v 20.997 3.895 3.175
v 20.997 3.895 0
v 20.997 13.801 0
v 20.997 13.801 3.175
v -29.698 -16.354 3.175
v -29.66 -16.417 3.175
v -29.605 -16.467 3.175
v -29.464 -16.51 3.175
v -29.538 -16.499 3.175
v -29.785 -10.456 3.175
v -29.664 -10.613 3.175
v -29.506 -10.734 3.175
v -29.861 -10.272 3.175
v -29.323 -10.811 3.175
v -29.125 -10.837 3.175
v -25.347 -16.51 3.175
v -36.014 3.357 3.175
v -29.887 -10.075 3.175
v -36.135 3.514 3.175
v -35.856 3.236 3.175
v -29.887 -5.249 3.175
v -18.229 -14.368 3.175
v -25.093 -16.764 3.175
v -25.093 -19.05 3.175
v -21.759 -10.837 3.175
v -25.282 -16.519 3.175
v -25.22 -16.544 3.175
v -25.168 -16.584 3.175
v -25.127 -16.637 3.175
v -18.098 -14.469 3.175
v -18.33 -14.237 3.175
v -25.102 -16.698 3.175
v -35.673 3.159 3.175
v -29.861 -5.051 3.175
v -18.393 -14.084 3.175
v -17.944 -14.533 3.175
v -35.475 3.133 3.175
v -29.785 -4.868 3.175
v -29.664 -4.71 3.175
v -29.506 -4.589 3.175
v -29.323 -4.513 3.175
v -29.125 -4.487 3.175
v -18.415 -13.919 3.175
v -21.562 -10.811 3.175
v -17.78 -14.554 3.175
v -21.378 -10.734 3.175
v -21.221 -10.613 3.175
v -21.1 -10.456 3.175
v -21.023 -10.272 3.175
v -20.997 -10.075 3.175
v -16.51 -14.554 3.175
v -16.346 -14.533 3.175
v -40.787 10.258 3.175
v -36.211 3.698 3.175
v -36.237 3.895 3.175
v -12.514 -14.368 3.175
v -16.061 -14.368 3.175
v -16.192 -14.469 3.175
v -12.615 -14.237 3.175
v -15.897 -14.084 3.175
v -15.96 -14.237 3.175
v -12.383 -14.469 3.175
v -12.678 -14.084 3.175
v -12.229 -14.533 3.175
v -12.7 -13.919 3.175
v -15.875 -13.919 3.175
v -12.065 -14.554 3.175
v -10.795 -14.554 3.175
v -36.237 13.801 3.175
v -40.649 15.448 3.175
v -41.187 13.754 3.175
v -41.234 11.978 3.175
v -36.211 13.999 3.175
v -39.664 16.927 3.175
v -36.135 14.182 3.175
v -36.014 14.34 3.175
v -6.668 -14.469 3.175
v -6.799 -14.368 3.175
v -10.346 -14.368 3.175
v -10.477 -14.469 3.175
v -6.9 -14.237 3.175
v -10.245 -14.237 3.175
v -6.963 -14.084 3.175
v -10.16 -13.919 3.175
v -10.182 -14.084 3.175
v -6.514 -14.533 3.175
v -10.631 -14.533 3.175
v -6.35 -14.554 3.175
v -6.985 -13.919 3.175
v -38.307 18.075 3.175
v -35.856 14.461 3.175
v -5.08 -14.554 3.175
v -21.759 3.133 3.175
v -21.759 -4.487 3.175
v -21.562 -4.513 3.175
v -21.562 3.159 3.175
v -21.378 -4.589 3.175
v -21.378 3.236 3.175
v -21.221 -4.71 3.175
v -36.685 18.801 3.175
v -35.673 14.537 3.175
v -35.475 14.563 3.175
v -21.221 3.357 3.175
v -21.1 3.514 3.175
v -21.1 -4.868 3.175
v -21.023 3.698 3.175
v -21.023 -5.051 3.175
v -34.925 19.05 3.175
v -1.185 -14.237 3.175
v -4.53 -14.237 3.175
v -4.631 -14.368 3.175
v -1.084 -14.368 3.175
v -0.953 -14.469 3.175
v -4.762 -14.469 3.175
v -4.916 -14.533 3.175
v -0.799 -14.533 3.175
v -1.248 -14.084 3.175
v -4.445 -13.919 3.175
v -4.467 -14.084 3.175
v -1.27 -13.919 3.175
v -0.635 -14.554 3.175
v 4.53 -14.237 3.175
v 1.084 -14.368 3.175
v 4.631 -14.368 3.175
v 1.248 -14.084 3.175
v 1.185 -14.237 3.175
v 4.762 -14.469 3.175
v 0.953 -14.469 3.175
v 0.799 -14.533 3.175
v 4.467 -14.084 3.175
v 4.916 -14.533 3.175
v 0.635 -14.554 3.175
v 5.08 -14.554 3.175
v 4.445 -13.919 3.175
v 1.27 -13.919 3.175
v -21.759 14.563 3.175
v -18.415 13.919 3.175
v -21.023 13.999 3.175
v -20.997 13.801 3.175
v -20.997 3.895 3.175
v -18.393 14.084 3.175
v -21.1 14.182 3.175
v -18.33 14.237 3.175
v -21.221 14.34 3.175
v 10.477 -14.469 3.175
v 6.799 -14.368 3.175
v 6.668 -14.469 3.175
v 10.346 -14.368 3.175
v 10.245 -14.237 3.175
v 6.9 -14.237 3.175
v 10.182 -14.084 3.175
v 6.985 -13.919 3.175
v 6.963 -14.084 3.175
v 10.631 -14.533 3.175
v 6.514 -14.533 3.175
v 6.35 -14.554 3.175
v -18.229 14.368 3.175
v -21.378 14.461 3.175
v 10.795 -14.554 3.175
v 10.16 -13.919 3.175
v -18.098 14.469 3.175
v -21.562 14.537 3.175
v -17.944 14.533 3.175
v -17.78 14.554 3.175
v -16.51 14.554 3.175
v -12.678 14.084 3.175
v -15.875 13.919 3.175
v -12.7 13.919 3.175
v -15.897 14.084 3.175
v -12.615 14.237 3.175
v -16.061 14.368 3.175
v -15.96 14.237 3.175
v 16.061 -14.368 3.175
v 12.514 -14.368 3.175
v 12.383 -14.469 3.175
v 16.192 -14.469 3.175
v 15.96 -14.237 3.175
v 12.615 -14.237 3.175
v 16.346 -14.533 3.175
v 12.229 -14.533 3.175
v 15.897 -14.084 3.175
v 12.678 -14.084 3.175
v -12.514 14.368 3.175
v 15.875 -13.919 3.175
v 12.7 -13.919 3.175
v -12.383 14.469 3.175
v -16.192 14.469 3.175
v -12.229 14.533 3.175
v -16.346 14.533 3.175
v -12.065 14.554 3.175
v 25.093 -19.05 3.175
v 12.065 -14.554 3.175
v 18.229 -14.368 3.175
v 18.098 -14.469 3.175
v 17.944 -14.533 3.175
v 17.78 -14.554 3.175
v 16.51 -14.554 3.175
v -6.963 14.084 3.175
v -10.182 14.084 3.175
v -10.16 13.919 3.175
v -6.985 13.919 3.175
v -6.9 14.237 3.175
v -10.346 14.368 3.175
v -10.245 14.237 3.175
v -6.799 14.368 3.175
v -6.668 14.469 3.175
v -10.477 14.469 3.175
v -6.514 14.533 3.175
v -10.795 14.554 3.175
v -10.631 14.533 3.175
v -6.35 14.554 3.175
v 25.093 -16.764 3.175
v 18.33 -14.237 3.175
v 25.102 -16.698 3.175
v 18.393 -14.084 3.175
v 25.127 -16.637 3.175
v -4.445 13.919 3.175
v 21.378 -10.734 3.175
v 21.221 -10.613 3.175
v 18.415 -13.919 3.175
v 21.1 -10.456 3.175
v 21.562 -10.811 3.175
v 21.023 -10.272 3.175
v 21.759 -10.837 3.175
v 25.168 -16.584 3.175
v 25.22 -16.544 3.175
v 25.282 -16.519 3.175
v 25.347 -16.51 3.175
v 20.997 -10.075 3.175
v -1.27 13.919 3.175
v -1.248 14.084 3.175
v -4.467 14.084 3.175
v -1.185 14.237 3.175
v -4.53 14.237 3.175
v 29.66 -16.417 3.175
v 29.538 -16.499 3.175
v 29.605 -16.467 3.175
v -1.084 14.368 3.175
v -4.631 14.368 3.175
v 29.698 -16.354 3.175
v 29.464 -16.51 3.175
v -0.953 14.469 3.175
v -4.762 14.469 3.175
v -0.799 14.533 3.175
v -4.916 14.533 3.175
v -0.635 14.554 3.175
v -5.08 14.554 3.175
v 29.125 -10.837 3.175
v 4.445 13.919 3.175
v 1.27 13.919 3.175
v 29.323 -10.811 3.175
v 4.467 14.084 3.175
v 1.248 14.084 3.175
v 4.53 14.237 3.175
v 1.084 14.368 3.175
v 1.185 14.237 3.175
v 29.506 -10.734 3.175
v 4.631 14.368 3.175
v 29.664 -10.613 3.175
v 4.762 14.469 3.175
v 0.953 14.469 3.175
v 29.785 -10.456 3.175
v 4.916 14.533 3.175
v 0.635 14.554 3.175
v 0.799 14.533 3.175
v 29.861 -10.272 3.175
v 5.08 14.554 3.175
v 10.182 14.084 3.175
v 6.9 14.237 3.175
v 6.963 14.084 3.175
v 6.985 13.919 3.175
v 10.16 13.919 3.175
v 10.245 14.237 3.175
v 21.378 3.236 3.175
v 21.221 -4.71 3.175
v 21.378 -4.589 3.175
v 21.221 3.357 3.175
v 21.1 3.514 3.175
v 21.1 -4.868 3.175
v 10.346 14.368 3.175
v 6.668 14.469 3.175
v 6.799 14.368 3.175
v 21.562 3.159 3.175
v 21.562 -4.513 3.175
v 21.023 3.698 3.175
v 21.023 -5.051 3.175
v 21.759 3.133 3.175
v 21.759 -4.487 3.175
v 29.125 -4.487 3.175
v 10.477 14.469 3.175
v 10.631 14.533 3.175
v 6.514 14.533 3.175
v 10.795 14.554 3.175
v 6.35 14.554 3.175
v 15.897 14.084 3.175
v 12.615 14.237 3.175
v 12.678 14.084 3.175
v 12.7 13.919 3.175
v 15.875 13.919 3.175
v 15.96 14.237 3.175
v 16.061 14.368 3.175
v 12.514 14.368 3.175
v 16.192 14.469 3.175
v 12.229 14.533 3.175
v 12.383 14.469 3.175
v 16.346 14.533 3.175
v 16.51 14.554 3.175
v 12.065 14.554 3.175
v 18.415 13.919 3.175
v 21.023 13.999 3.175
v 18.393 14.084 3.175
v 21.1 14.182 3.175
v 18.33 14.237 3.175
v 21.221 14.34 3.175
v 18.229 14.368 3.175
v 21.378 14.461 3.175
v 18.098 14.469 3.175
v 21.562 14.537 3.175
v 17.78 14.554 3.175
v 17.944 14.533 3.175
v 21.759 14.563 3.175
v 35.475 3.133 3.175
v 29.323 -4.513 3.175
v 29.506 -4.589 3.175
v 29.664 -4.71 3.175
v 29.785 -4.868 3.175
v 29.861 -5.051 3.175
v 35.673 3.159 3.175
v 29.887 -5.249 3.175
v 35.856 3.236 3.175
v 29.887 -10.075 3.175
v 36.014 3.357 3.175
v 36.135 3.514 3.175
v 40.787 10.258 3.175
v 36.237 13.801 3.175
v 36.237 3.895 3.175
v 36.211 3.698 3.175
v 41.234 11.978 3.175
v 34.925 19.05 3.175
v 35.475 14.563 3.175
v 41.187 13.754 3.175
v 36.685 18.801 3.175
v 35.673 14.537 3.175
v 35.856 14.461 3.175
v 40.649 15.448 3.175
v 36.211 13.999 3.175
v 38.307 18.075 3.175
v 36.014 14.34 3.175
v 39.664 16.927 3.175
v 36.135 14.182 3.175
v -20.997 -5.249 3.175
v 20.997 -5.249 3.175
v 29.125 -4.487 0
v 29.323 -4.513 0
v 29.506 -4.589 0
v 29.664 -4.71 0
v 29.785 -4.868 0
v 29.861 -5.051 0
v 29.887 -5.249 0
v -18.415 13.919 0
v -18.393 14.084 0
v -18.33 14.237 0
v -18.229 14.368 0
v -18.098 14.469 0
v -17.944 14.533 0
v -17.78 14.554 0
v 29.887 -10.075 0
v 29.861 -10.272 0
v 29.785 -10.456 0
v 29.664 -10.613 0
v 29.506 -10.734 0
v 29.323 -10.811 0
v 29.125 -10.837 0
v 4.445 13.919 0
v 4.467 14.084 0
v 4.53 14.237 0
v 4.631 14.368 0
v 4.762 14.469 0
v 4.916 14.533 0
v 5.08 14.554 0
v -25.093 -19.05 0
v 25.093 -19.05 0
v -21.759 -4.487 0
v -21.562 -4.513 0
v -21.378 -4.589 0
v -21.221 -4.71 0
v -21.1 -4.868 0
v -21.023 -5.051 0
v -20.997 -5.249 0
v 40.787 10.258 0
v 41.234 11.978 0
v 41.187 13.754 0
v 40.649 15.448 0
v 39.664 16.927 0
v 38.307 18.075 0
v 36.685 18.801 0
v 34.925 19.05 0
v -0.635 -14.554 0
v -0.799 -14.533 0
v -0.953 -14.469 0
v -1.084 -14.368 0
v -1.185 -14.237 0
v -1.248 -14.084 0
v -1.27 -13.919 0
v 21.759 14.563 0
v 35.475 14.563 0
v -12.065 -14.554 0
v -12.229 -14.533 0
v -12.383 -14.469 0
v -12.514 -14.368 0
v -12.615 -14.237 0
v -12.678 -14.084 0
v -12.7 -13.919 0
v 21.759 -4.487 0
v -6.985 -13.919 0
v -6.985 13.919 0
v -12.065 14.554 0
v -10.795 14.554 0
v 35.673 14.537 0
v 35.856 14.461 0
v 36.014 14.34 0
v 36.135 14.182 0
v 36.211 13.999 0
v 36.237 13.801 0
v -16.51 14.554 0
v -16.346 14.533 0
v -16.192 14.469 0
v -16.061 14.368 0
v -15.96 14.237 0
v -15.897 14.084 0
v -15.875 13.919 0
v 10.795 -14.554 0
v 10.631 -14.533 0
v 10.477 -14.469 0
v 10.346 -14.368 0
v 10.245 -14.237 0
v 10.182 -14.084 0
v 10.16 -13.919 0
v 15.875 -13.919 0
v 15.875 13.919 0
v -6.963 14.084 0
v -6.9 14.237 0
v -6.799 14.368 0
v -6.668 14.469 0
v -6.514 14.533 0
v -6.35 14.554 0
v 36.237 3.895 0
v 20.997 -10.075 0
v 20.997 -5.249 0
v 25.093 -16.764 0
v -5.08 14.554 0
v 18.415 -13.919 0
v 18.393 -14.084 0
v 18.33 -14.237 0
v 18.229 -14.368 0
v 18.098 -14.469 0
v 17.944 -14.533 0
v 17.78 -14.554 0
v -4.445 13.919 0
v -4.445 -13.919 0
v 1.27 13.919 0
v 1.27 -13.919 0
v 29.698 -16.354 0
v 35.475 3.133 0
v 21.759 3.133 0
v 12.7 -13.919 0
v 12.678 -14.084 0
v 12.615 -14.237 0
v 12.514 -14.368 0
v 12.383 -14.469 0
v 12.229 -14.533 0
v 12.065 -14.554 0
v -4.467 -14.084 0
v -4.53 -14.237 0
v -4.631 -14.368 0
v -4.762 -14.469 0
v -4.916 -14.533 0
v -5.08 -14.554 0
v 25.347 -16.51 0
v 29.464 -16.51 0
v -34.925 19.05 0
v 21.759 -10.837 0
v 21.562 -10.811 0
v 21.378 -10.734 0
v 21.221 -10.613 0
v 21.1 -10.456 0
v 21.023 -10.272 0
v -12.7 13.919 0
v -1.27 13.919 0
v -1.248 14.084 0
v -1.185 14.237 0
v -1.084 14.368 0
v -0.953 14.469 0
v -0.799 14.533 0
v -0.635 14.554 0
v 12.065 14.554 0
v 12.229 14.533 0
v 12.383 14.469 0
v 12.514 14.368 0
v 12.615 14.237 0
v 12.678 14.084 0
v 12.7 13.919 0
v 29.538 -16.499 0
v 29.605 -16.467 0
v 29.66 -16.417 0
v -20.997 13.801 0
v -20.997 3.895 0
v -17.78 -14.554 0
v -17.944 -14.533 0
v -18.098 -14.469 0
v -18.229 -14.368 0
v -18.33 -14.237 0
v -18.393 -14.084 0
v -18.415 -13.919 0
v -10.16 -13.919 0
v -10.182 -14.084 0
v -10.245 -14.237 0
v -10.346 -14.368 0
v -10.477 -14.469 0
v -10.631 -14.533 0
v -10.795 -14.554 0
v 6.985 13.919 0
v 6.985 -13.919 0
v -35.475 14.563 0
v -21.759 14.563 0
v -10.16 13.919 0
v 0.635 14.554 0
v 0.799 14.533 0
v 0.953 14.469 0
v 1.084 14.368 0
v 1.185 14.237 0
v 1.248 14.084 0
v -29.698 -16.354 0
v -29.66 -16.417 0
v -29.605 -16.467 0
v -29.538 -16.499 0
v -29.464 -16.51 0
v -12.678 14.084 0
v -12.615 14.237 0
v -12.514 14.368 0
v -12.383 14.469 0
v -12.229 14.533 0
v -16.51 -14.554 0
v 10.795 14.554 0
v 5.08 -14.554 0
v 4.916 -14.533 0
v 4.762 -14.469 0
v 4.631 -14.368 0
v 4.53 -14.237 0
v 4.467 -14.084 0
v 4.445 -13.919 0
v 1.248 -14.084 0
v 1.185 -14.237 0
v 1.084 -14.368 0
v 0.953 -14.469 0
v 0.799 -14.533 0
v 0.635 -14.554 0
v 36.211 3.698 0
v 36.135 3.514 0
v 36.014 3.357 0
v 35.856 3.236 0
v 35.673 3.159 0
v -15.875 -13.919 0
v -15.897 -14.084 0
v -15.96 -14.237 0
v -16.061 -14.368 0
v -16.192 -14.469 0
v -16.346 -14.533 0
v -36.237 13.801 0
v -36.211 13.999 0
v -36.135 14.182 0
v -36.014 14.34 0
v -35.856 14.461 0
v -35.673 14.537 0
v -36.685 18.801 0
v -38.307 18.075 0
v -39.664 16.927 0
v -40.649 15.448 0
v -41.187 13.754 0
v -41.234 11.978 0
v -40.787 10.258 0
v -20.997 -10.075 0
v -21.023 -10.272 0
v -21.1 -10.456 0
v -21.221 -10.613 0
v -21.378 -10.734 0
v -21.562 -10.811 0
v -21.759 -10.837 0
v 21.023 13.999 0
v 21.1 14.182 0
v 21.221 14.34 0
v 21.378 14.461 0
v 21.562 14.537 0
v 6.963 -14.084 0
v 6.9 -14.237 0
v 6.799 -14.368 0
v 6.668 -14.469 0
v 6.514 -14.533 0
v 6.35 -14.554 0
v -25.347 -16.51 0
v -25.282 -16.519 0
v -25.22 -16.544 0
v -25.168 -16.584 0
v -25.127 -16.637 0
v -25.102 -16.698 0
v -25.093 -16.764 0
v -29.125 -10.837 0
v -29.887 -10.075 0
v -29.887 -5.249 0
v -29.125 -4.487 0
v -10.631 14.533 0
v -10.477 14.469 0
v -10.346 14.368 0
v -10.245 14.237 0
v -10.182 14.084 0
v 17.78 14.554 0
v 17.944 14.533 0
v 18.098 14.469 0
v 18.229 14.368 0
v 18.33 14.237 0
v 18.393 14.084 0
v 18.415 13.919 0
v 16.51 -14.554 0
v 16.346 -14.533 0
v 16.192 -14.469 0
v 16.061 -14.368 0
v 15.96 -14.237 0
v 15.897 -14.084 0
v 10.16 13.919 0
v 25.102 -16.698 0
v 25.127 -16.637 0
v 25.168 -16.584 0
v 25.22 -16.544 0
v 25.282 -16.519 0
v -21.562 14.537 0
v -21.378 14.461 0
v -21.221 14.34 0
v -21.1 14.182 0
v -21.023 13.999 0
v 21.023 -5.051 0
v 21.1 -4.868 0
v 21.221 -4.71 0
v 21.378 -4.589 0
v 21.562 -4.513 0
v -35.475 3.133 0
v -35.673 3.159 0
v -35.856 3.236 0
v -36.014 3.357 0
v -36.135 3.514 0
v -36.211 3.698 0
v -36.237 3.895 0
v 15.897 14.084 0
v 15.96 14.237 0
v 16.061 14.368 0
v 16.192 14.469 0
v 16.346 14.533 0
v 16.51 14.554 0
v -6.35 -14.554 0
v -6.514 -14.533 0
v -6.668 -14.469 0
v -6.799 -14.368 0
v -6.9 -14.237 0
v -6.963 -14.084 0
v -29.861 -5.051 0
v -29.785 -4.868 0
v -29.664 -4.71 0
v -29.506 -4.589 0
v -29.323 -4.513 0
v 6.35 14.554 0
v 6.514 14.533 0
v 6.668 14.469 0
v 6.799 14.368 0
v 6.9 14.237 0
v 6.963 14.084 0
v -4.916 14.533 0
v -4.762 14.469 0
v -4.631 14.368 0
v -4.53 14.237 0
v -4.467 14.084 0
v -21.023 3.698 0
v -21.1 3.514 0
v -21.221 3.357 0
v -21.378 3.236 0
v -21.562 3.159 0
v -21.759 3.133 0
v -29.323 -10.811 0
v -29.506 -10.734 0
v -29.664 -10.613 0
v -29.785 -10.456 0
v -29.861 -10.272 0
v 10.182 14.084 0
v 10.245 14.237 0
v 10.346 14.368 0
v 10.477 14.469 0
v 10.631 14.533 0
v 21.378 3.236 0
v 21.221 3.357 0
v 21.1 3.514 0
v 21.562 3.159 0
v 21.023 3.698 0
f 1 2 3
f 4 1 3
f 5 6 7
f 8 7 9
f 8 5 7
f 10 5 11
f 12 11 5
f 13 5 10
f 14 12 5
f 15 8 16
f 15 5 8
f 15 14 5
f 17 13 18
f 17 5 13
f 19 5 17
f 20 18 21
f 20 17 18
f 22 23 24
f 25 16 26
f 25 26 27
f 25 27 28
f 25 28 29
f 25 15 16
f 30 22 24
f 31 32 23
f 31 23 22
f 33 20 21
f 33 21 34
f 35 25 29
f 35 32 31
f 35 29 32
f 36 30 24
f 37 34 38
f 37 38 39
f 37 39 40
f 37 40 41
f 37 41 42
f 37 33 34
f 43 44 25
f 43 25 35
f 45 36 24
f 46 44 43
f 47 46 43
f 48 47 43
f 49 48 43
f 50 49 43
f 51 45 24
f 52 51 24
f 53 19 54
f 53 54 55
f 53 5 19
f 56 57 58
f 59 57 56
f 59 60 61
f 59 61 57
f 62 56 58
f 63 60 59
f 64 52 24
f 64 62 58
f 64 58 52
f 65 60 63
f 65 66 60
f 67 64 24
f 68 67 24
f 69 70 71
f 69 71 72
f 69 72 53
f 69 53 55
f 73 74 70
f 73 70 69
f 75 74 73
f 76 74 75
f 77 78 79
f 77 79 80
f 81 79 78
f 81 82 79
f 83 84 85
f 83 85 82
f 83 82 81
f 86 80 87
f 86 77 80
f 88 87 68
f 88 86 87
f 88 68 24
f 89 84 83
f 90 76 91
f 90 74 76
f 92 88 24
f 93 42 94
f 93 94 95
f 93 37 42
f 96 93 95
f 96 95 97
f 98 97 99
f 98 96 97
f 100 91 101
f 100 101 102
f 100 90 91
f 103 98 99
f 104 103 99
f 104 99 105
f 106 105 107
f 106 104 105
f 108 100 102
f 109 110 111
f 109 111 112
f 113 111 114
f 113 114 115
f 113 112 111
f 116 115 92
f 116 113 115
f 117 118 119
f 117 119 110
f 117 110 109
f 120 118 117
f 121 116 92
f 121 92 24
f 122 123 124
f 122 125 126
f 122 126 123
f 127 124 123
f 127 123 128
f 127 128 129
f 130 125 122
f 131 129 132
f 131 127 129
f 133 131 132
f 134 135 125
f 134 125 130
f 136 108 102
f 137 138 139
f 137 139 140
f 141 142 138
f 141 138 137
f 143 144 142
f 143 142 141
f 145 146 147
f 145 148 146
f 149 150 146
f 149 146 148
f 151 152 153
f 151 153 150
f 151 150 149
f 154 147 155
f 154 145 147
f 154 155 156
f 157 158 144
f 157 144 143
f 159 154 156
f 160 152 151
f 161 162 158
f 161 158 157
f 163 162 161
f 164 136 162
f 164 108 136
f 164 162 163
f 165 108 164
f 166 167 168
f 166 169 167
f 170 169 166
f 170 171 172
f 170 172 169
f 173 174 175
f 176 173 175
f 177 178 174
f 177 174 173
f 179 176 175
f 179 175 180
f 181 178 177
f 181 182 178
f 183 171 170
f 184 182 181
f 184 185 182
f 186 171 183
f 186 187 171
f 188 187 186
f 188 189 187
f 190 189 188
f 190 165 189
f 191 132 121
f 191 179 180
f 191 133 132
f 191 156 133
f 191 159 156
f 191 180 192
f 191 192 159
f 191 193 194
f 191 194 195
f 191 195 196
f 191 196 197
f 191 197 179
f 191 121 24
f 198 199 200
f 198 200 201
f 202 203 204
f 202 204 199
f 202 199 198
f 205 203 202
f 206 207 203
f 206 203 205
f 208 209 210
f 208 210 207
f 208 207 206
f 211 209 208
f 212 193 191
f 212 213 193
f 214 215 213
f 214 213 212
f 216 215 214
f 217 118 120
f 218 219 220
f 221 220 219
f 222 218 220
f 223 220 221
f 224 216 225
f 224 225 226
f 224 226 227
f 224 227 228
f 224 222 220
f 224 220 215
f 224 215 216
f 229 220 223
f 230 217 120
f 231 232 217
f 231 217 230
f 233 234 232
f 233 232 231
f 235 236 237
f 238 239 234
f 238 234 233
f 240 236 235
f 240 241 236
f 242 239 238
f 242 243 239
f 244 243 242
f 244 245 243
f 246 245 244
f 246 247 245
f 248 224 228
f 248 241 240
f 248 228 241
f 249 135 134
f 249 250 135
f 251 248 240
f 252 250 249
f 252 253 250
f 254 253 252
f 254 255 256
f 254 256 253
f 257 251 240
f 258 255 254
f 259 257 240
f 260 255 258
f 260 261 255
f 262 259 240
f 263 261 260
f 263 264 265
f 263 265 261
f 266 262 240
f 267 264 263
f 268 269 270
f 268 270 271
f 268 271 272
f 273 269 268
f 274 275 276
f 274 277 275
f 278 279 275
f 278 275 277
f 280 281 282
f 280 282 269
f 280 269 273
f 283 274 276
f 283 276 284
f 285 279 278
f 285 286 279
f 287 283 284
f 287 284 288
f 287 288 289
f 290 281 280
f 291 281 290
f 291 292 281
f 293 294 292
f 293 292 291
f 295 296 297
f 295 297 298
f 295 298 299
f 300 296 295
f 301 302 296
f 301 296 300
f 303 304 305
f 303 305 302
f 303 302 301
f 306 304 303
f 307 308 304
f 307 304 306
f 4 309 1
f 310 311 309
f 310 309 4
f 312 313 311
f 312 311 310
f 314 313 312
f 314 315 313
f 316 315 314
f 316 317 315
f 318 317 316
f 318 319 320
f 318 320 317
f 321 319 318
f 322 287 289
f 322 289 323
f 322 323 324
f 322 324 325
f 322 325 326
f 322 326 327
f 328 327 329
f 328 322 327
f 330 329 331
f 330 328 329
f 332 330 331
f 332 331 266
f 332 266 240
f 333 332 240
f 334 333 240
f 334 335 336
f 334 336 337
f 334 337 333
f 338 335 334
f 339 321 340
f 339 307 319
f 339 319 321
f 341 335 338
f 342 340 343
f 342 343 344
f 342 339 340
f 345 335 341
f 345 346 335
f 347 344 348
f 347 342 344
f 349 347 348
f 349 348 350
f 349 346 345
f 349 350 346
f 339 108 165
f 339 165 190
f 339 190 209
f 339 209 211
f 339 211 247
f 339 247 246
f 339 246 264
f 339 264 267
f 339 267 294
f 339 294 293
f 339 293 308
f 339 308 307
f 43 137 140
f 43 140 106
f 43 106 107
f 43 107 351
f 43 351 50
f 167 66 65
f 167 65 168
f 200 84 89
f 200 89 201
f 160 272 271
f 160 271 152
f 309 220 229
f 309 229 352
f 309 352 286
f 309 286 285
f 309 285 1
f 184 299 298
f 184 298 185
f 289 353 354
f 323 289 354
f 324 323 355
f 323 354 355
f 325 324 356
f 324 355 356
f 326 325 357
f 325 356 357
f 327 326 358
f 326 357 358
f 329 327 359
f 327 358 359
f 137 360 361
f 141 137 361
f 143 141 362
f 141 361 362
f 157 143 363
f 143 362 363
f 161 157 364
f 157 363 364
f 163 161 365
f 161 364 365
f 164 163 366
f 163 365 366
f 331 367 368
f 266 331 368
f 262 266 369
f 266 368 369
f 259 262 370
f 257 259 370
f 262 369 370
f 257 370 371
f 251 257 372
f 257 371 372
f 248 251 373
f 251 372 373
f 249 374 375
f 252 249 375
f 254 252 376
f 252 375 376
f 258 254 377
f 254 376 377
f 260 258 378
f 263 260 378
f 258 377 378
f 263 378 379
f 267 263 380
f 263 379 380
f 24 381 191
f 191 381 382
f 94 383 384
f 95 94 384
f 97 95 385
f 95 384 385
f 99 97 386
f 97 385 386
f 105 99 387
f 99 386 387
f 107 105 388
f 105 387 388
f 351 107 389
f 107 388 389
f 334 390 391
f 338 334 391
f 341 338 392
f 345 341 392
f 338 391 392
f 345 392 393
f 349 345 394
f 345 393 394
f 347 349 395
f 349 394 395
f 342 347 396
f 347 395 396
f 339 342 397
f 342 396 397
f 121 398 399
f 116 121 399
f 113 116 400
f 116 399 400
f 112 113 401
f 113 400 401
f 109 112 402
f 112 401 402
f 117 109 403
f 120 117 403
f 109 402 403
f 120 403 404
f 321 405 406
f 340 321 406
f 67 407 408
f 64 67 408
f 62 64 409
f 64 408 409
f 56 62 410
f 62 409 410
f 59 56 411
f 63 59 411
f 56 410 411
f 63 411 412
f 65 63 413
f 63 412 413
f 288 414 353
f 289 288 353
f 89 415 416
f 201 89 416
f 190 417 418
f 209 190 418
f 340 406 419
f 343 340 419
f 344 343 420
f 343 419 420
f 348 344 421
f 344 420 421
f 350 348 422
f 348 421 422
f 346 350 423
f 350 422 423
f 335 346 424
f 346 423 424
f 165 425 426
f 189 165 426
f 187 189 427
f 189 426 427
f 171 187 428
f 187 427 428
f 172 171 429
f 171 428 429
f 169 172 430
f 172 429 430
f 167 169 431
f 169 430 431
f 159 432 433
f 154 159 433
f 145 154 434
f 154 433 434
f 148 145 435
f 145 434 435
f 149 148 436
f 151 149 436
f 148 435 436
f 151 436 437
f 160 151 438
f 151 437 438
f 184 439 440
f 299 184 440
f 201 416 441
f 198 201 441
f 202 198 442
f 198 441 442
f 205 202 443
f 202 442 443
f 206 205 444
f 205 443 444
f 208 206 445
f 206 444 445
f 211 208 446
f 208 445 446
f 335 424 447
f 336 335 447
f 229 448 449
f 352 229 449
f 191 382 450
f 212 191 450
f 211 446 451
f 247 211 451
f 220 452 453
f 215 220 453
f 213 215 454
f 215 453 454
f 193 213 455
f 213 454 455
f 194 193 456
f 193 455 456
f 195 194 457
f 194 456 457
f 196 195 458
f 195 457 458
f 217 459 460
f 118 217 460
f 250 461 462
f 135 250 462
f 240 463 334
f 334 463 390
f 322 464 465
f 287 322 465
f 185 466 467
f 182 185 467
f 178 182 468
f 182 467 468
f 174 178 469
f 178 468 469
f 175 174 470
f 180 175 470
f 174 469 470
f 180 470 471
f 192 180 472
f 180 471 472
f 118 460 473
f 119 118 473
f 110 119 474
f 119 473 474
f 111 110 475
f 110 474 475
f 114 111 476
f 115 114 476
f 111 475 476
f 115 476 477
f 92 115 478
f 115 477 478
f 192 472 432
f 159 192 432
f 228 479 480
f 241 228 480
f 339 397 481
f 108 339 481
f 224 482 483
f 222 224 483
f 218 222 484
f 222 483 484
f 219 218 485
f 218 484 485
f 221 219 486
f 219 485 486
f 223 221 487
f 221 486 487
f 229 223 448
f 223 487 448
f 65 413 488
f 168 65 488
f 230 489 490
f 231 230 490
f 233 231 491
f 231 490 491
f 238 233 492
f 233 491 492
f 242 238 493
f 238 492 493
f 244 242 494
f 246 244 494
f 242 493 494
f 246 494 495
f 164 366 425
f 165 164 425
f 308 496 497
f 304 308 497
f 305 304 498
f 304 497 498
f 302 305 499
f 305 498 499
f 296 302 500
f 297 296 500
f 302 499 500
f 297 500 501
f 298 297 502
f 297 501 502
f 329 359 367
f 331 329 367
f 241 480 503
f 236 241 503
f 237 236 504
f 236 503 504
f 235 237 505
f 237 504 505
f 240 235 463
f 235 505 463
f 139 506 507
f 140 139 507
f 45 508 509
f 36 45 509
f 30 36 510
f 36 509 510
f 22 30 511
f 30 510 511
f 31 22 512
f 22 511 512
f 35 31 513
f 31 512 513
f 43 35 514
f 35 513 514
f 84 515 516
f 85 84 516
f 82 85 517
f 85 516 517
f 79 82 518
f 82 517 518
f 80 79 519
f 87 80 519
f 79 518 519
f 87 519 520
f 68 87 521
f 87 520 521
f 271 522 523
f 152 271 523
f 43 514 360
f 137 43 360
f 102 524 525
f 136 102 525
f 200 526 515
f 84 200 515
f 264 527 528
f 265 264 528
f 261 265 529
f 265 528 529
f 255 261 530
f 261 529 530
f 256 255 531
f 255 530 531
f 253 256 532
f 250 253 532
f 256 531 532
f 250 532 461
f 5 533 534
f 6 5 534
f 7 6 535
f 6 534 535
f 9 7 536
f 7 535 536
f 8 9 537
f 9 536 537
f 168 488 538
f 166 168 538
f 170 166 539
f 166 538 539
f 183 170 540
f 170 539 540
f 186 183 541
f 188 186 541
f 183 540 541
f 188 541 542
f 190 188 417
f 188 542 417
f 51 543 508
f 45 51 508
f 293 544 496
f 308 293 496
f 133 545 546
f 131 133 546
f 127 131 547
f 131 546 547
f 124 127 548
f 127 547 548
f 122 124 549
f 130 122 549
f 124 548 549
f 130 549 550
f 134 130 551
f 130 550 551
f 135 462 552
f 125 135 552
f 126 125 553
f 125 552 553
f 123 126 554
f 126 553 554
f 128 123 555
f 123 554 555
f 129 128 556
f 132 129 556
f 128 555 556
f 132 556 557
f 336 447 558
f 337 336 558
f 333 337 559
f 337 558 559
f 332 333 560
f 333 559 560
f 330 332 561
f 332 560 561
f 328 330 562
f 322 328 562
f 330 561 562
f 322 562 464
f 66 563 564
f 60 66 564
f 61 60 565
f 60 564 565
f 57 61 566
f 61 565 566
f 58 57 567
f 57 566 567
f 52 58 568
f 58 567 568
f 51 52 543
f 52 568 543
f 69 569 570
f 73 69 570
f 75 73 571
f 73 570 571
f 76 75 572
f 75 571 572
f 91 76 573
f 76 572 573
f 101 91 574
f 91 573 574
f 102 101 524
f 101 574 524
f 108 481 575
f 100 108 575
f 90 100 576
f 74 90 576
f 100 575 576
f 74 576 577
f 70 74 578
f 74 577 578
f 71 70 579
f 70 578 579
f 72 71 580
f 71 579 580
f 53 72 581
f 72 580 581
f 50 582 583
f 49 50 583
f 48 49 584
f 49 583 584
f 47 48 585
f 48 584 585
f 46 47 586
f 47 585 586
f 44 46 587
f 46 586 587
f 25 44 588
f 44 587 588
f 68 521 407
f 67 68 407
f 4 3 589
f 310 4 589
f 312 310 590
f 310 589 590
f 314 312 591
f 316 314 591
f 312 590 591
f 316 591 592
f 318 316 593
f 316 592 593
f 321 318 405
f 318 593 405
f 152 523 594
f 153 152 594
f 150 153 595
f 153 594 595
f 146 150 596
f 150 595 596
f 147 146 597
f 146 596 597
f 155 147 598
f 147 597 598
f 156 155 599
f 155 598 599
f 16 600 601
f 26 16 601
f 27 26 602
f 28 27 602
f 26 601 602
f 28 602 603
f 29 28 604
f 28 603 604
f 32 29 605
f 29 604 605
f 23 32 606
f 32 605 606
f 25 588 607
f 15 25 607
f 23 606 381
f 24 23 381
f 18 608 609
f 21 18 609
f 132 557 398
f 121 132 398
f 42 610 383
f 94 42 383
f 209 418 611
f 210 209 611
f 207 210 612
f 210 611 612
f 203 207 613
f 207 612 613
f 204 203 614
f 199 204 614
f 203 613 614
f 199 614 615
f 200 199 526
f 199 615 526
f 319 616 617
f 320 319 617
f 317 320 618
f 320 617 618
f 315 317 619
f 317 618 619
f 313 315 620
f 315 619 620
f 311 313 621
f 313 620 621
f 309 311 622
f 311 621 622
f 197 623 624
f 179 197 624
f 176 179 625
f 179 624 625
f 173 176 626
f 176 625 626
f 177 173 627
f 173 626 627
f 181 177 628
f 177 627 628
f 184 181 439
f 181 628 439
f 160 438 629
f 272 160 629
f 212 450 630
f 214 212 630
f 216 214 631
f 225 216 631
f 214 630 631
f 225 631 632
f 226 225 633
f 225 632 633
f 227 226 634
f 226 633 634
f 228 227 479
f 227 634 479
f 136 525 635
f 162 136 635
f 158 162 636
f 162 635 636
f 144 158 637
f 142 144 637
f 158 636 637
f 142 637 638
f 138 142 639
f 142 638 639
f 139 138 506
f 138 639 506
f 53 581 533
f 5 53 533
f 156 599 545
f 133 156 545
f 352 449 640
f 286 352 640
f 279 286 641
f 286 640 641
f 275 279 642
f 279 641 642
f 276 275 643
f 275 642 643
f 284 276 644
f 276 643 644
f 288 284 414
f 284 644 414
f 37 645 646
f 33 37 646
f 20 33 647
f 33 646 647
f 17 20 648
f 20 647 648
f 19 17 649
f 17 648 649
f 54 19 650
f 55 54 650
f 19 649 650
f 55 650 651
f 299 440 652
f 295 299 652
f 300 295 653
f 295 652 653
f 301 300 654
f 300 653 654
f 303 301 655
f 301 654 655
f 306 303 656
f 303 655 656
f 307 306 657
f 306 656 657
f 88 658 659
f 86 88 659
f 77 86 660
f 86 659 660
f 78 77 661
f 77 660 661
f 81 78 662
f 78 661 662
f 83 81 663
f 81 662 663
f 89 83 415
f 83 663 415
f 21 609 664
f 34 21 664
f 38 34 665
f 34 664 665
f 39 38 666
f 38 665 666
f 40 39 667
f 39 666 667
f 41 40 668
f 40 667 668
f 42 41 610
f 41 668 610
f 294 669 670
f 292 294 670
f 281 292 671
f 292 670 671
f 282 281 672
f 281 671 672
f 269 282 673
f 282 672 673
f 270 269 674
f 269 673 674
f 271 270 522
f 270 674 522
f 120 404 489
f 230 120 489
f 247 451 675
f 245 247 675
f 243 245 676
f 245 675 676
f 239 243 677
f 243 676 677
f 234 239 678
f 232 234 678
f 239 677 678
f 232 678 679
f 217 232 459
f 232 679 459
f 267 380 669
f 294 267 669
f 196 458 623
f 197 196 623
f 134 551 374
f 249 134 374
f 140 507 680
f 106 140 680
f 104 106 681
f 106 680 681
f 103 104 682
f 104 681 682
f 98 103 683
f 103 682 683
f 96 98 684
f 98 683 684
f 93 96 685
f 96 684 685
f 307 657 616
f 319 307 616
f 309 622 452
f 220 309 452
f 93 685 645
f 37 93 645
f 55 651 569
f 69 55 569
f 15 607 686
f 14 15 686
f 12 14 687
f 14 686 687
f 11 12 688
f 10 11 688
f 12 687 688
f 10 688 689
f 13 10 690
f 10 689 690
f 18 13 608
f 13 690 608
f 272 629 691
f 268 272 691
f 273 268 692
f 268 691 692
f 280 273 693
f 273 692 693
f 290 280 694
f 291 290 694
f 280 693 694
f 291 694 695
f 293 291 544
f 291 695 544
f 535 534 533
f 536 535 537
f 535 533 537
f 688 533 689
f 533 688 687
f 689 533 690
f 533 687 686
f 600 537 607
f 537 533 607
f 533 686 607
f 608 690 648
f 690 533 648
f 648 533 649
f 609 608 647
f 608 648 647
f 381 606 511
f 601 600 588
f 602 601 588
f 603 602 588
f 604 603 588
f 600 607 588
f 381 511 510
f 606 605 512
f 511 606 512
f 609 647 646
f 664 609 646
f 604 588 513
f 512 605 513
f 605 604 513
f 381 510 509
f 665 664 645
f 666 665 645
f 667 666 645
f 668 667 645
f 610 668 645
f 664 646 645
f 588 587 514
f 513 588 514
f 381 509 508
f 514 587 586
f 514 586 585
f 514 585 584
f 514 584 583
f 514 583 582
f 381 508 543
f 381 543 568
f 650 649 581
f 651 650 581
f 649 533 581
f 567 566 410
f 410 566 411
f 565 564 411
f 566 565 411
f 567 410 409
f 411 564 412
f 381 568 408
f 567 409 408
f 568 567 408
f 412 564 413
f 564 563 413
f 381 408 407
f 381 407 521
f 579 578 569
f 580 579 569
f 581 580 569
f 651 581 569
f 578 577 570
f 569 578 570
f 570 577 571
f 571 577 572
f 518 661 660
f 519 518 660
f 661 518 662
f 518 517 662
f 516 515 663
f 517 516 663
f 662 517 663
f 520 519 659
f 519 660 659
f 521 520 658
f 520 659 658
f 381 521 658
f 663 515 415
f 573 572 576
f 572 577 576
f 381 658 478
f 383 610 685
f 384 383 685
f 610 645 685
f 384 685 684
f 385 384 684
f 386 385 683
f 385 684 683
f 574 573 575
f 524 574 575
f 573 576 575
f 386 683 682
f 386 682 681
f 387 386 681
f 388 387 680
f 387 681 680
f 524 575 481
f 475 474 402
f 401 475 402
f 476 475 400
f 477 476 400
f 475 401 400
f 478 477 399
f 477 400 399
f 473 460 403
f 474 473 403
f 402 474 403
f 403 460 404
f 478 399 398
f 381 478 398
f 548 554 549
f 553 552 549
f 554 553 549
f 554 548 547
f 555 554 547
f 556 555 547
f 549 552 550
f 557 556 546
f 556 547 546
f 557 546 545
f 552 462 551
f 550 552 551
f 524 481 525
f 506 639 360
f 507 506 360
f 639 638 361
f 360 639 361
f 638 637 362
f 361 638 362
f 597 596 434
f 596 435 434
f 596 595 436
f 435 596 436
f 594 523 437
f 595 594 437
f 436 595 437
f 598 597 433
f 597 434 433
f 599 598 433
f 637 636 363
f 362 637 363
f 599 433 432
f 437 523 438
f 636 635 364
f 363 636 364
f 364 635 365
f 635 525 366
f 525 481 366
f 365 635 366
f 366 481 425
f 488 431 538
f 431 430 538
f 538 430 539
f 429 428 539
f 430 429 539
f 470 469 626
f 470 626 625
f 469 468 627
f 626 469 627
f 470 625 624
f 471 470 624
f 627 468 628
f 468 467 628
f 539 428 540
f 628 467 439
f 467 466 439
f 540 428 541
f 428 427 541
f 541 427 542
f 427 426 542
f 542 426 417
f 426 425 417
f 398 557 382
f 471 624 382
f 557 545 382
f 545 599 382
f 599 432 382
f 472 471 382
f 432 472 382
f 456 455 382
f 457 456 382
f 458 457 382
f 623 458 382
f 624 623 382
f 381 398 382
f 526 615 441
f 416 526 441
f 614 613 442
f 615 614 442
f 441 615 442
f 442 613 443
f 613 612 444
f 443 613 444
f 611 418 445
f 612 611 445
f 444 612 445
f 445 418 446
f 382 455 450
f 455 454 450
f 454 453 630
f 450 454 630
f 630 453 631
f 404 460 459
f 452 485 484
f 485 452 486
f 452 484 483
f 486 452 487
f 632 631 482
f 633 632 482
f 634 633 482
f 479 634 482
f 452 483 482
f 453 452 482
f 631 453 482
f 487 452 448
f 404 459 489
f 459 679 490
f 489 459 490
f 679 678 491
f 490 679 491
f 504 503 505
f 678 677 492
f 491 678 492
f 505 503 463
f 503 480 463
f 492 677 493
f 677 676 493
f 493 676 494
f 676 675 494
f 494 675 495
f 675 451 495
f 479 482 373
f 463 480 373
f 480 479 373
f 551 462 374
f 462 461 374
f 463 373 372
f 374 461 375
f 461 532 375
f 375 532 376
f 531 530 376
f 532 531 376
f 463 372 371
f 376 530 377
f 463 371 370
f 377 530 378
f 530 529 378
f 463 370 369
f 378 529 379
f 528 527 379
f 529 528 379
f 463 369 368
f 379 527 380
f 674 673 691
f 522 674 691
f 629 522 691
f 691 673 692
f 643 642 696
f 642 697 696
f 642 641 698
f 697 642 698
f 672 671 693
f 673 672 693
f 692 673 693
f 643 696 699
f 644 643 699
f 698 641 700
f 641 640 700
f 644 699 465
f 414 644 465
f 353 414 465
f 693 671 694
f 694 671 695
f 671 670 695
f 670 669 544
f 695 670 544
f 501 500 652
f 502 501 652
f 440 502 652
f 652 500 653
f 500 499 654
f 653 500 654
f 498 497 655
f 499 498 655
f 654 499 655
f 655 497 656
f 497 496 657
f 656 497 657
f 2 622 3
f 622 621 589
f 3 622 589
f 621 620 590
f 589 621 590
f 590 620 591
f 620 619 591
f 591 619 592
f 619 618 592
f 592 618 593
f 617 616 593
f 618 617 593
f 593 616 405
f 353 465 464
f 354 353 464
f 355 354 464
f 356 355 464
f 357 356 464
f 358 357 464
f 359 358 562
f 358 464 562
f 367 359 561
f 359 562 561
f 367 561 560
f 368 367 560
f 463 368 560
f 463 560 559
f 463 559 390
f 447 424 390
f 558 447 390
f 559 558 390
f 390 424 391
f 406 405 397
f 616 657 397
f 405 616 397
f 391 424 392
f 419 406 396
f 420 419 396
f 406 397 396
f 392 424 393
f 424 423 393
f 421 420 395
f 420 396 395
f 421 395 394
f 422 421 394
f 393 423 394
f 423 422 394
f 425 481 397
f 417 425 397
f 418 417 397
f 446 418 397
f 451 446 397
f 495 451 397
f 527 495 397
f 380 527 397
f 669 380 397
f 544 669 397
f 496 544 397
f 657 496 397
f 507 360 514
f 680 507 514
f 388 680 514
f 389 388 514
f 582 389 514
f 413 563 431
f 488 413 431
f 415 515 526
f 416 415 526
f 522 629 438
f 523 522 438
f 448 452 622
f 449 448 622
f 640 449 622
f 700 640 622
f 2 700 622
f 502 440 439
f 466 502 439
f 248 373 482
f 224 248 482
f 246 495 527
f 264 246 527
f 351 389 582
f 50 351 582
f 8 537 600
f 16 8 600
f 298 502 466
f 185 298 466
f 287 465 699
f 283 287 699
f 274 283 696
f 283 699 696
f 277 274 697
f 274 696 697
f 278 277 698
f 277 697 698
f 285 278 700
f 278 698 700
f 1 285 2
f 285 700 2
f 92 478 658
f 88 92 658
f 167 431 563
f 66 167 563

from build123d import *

# Parameters (mm, degrees)
F1_DEPTH = 3.175


with BuildPart() as f1:
    # F0 (on Top) → F1 (new body)
    with BuildSketch(Plane.XY):
        with BuildLine():
            ThreePointArc((40.786538, 10.257692), (40.208519, 16.222346), (34.925, 19.05))
            Line((34.925, 19.05), (0.141111, 19.05))
            Line((0.141111, 19.05), (-0.141111, 19.05))
            Line((-0.141111, 19.05), (-34.925, 19.05))
            ThreePointArc((-34.925, 19.05), (-40.208519, 16.222346), (-40.786538, 10.257692))
            Line((-40.786538, 10.257692), (-29.698462, -16.353692))
            ThreePointArc((-29.698462, -16.353692), (-29.604894, -16.467341), (-29.464, -16.51))
            Line((-29.464, -16.51), (-25.347444, -16.51))
            ThreePointArc((-25.347444, -16.51), (-25.167839, -16.584395), (-25.093444, -16.764))
            Line((-25.093444, -16.764), (-25.093444, -19.05))
            Line((-25.093444, -19.05), (-0.141111, -19.05))
            Line((-0.141111, -19.05), (0.141111, -19.05))
            Line((0.141111, -19.05), (25.093444, -19.05))
            Line((25.093444, -19.05), (25.093444, -16.764))
            ThreePointArc((25.093444, -16.764), (25.167839, -16.584395), (25.347444, -16.51))
            Line((25.347444, -16.51), (29.464, -16.51))
            ThreePointArc((29.464, -16.51), (29.604894, -16.467341), (29.698462, -16.353692))
            Line((29.698462, -16.353692), (40.786538, 10.257692))
        make_face()
        with BuildLine():
            Line((-21.759422, -10.836581), (-29.125422, -10.836581))
            ThreePointArc((-29.125422, -10.836581), (-29.664238, -10.613396), (-29.887422, -10.074581))
            Line((-29.887422, -10.074581), (-29.887422, -5.248581))
            ThreePointArc((-29.887422, -5.248581), (-29.664238, -4.709765), (-29.125422, -4.486581))
            Line((-29.125422, -4.486581), (-21.759422, -4.486581))
            ThreePointArc((-21.759422, -4.486581), (-21.220607, -4.709765), (-20.997422, -5.248581))
            Line((-20.997422, -5.248581), (-20.997422, -10.074581))
            ThreePointArc((-20.997422, -10.074581), (-21.220607, -10.613396), (-21.759422, -10.836581))
        make_face(mode=Mode.SUBTRACT)
        with BuildLine():
            Line((21.759422, -4.486581), (29.125422, -4.486581))
            ThreePointArc((29.125422, -4.486581), (29.664238, -4.709765), (29.887422, -5.248581))
            Line((29.887422, -5.248581), (29.887422, -10.074581))
            ThreePointArc((29.887422, -10.074581), (29.664238, -10.613396), (29.125422, -10.836581))
            Line((29.125422, -10.836581), (21.759422, -10.836581))
            ThreePointArc((21.759422, -10.836581), (21.220607, -10.613396), (20.997422, -10.074581))
            Line((20.997422, -10.074581), (20.997422, -5.248581))
            ThreePointArc((20.997422, -5.248581), (21.220607, -4.709765), (21.759422, -4.486581))
        make_face(mode=Mode.SUBTRACT)
        with BuildLine():
            Line((-21.759422, 3.133419), (-35.475422, 3.133419))
            ThreePointArc((-35.475422, 3.133419), (-36.014238, 3.356604), (-36.237422, 3.895419))
            Line((-36.237422, 3.895419), (-36.237422, 13.801419))
            ThreePointArc((-36.237422, 13.801419), (-36.014238, 14.340235), (-35.475422, 14.563419))
            Line((-35.475422, 14.563419), (-21.759422, 14.563419))
            ThreePointArc((-21.759422, 14.563419), (-21.220607, 14.340235), (-20.997422, 13.801419))
            Line((-20.997422, 13.801419), (-20.997422, 3.895419))
            ThreePointArc((-20.997422, 3.895419), (-21.220607, 3.356604), (-21.759422, 3.133419))
        make_face(mode=Mode.SUBTRACT)
        with BuildLine():
            Line((-18.415, -13.9192), (-18.415, 13.9192))
            ThreePointArc((-18.415, 13.9192), (-18.229013, 14.368213), (-17.78, 14.5542))
            Line((-17.78, 14.5542), (-16.51, 14.5542))
            ThreePointArc((-16.51, 14.5542), (-16.060987, 14.368213), (-15.875, 13.9192))
            Line((-15.875, 13.9192), (-15.875, -13.9192))
            ThreePointArc((-15.875, -13.9192), (-16.060987, -14.368213), (-16.51, -14.5542))
            Line((-16.51, -14.5542), (-17.78, -14.5542))
            ThreePointArc((-17.78, -14.5542), (-18.229013, -14.368213), (-18.415, -13.9192))
        make_face(mode=Mode.SUBTRACT)
        with BuildLine():
            Line((-12.7, -13.9192), (-12.7, 13.9192))
            ThreePointArc((-12.7, 13.9192), (-12.514013, 14.368213), (-12.065, 14.5542))
            Line((-12.065, 14.5542), (-10.795, 14.5542))
            ThreePointArc((-10.795, 14.5542), (-10.345987, 14.368213), (-10.16, 13.9192))
            Line((-10.16, 13.9192), (-10.16, -13.9192))
            ThreePointArc((-10.16, -13.9192), (-10.345987, -14.368213), (-10.795, -14.5542))
            Line((-10.795, -14.5542), (-12.065, -14.5542))
            ThreePointArc((-12.065, -14.5542), (-12.514013, -14.368213), (-12.7, -13.9192))
        make_face(mode=Mode.SUBTRACT)
        with BuildLine():
            Line((-6.985, -13.9192), (-6.985, 13.9192))
            ThreePointArc((-6.985, 13.9192), (-6.799013, 14.368213), (-6.35, 14.5542))
            Line((-6.35, 14.5542), (-5.08, 14.5542))
            ThreePointArc((-5.08, 14.5542), (-4.630987, 14.368213), (-4.445, 13.9192))
            Line((-4.445, 13.9192), (-4.445, -13.9192))
            ThreePointArc((-4.445, -13.9192), (-4.630987, -14.368213), (-5.08, -14.5542))
            Line((-5.08, -14.5542), (-6.35, -14.5542))
            ThreePointArc((-6.35, -14.5542), (-6.799013, -14.368213), (-6.985, -13.9192))
        make_face(mode=Mode.SUBTRACT)
        with BuildLine():
            Line((-0.635, 14.5542), (0.635, 14.5542))
            ThreePointArc((0.635, 14.5542), (1.084013, 14.368213), (1.27, 13.9192))
            Line((1.27, 13.9192), (1.27, -13.9192))
            ThreePointArc((1.27, -13.9192), (1.084013, -14.368213), (0.635, -14.5542))
            Line((0.635, -14.5542), (-0.635, -14.5542))
            ThreePointArc((-0.635, -14.5542), (-1.084013, -14.368213), (-1.27, -13.9192))
            Line((-1.27, -13.9192), (-1.27, 13.9192))
            ThreePointArc((-1.27, 13.9192), (-1.084013, 14.368213), (-0.635, 14.5542))
        make_face(mode=Mode.SUBTRACT)
        with BuildLine():
            ThreePointArc((6.35, 14.5542), (6.799013, 14.368213), (6.985, 13.9192))
            Line((6.985, 13.9192), (6.985, -13.9192))
            ThreePointArc((6.985, -13.9192), (6.799013, -14.368213), (6.35, -14.5542))
            Line((6.35, -14.5542), (5.08, -14.5542))
            ThreePointArc((5.08, -14.5542), (4.630987, -14.368213), (4.445, -13.9192))
            Line((4.445, -13.9192), (4.445, 13.9192))
            ThreePointArc((4.445, 13.9192), (4.630987, 14.368213), (5.08, 14.5542))
            Line((5.08, 14.5542), (6.35, 14.5542))
        make_face(mode=Mode.SUBTRACT)
        with BuildLine():
            ThreePointArc((12.065, 14.5542), (12.514013, 14.368213), (12.7, 13.9192))
            Line((12.7, 13.9192), (12.7, -13.9192))
            ThreePointArc((12.7, -13.9192), (12.514013, -14.368213), (12.065, -14.5542))
            Line((12.065, -14.5542), (10.795, -14.5542))
            ThreePointArc((10.795, -14.5542), (10.345987, -14.368213), (10.16, -13.9192))
            Line((10.16, -13.9192), (10.16, 13.9192))
            ThreePointArc((10.16, 13.9192), (10.345987, 14.368213), (10.795, 14.5542))
            Line((10.795, 14.5542), (12.065, 14.5542))
        make_face(mode=Mode.SUBTRACT)
        with BuildLine():
            ThreePointArc((17.78, 14.5542), (18.229013, 14.368213), (18.415, 13.9192))
            Line((18.415, 13.9192), (18.415, -13.9192))
            ThreePointArc((18.415, -13.9192), (18.229013, -14.368213), (17.78, -14.5542))
            Line((17.78, -14.5542), (16.51, -14.5542))
            ThreePointArc((16.51, -14.5542), (16.060987, -14.368213), (15.875, -13.9192))
            Line((15.875, -13.9192), (15.875, 13.9192))
            ThreePointArc((15.875, 13.9192), (16.060987, 14.368213), (16.51, 14.5542))
            Line((16.51, 14.5542), (17.78, 14.5542))
        make_face(mode=Mode.SUBTRACT)
        with BuildLine():
            Line((21.759422, 14.563419), (35.475422, 14.563419))
            ThreePointArc((35.475422, 14.563419), (36.014238, 14.340235), (36.237422, 13.801419))
            Line((36.237422, 13.801419), (36.237422, 3.895419))
            ThreePointArc((36.237422, 3.895419), (36.014238, 3.356604), (35.475422, 3.133419))
            Line((35.475422, 3.133419), (21.759422, 3.133419))
            ThreePointArc((21.759422, 3.133419), (21.220607, 3.356604), (20.997422, 3.895419))
            Line((20.997422, 3.895419), (20.997422, 13.801419))
            ThreePointArc((20.997422, 13.801419), (21.220607, 14.340235), (21.759422, 14.563419))
        make_face(mode=Mode.SUBTRACT)
    extrude(amount=F1_DEPTH)


solid = f1.part
